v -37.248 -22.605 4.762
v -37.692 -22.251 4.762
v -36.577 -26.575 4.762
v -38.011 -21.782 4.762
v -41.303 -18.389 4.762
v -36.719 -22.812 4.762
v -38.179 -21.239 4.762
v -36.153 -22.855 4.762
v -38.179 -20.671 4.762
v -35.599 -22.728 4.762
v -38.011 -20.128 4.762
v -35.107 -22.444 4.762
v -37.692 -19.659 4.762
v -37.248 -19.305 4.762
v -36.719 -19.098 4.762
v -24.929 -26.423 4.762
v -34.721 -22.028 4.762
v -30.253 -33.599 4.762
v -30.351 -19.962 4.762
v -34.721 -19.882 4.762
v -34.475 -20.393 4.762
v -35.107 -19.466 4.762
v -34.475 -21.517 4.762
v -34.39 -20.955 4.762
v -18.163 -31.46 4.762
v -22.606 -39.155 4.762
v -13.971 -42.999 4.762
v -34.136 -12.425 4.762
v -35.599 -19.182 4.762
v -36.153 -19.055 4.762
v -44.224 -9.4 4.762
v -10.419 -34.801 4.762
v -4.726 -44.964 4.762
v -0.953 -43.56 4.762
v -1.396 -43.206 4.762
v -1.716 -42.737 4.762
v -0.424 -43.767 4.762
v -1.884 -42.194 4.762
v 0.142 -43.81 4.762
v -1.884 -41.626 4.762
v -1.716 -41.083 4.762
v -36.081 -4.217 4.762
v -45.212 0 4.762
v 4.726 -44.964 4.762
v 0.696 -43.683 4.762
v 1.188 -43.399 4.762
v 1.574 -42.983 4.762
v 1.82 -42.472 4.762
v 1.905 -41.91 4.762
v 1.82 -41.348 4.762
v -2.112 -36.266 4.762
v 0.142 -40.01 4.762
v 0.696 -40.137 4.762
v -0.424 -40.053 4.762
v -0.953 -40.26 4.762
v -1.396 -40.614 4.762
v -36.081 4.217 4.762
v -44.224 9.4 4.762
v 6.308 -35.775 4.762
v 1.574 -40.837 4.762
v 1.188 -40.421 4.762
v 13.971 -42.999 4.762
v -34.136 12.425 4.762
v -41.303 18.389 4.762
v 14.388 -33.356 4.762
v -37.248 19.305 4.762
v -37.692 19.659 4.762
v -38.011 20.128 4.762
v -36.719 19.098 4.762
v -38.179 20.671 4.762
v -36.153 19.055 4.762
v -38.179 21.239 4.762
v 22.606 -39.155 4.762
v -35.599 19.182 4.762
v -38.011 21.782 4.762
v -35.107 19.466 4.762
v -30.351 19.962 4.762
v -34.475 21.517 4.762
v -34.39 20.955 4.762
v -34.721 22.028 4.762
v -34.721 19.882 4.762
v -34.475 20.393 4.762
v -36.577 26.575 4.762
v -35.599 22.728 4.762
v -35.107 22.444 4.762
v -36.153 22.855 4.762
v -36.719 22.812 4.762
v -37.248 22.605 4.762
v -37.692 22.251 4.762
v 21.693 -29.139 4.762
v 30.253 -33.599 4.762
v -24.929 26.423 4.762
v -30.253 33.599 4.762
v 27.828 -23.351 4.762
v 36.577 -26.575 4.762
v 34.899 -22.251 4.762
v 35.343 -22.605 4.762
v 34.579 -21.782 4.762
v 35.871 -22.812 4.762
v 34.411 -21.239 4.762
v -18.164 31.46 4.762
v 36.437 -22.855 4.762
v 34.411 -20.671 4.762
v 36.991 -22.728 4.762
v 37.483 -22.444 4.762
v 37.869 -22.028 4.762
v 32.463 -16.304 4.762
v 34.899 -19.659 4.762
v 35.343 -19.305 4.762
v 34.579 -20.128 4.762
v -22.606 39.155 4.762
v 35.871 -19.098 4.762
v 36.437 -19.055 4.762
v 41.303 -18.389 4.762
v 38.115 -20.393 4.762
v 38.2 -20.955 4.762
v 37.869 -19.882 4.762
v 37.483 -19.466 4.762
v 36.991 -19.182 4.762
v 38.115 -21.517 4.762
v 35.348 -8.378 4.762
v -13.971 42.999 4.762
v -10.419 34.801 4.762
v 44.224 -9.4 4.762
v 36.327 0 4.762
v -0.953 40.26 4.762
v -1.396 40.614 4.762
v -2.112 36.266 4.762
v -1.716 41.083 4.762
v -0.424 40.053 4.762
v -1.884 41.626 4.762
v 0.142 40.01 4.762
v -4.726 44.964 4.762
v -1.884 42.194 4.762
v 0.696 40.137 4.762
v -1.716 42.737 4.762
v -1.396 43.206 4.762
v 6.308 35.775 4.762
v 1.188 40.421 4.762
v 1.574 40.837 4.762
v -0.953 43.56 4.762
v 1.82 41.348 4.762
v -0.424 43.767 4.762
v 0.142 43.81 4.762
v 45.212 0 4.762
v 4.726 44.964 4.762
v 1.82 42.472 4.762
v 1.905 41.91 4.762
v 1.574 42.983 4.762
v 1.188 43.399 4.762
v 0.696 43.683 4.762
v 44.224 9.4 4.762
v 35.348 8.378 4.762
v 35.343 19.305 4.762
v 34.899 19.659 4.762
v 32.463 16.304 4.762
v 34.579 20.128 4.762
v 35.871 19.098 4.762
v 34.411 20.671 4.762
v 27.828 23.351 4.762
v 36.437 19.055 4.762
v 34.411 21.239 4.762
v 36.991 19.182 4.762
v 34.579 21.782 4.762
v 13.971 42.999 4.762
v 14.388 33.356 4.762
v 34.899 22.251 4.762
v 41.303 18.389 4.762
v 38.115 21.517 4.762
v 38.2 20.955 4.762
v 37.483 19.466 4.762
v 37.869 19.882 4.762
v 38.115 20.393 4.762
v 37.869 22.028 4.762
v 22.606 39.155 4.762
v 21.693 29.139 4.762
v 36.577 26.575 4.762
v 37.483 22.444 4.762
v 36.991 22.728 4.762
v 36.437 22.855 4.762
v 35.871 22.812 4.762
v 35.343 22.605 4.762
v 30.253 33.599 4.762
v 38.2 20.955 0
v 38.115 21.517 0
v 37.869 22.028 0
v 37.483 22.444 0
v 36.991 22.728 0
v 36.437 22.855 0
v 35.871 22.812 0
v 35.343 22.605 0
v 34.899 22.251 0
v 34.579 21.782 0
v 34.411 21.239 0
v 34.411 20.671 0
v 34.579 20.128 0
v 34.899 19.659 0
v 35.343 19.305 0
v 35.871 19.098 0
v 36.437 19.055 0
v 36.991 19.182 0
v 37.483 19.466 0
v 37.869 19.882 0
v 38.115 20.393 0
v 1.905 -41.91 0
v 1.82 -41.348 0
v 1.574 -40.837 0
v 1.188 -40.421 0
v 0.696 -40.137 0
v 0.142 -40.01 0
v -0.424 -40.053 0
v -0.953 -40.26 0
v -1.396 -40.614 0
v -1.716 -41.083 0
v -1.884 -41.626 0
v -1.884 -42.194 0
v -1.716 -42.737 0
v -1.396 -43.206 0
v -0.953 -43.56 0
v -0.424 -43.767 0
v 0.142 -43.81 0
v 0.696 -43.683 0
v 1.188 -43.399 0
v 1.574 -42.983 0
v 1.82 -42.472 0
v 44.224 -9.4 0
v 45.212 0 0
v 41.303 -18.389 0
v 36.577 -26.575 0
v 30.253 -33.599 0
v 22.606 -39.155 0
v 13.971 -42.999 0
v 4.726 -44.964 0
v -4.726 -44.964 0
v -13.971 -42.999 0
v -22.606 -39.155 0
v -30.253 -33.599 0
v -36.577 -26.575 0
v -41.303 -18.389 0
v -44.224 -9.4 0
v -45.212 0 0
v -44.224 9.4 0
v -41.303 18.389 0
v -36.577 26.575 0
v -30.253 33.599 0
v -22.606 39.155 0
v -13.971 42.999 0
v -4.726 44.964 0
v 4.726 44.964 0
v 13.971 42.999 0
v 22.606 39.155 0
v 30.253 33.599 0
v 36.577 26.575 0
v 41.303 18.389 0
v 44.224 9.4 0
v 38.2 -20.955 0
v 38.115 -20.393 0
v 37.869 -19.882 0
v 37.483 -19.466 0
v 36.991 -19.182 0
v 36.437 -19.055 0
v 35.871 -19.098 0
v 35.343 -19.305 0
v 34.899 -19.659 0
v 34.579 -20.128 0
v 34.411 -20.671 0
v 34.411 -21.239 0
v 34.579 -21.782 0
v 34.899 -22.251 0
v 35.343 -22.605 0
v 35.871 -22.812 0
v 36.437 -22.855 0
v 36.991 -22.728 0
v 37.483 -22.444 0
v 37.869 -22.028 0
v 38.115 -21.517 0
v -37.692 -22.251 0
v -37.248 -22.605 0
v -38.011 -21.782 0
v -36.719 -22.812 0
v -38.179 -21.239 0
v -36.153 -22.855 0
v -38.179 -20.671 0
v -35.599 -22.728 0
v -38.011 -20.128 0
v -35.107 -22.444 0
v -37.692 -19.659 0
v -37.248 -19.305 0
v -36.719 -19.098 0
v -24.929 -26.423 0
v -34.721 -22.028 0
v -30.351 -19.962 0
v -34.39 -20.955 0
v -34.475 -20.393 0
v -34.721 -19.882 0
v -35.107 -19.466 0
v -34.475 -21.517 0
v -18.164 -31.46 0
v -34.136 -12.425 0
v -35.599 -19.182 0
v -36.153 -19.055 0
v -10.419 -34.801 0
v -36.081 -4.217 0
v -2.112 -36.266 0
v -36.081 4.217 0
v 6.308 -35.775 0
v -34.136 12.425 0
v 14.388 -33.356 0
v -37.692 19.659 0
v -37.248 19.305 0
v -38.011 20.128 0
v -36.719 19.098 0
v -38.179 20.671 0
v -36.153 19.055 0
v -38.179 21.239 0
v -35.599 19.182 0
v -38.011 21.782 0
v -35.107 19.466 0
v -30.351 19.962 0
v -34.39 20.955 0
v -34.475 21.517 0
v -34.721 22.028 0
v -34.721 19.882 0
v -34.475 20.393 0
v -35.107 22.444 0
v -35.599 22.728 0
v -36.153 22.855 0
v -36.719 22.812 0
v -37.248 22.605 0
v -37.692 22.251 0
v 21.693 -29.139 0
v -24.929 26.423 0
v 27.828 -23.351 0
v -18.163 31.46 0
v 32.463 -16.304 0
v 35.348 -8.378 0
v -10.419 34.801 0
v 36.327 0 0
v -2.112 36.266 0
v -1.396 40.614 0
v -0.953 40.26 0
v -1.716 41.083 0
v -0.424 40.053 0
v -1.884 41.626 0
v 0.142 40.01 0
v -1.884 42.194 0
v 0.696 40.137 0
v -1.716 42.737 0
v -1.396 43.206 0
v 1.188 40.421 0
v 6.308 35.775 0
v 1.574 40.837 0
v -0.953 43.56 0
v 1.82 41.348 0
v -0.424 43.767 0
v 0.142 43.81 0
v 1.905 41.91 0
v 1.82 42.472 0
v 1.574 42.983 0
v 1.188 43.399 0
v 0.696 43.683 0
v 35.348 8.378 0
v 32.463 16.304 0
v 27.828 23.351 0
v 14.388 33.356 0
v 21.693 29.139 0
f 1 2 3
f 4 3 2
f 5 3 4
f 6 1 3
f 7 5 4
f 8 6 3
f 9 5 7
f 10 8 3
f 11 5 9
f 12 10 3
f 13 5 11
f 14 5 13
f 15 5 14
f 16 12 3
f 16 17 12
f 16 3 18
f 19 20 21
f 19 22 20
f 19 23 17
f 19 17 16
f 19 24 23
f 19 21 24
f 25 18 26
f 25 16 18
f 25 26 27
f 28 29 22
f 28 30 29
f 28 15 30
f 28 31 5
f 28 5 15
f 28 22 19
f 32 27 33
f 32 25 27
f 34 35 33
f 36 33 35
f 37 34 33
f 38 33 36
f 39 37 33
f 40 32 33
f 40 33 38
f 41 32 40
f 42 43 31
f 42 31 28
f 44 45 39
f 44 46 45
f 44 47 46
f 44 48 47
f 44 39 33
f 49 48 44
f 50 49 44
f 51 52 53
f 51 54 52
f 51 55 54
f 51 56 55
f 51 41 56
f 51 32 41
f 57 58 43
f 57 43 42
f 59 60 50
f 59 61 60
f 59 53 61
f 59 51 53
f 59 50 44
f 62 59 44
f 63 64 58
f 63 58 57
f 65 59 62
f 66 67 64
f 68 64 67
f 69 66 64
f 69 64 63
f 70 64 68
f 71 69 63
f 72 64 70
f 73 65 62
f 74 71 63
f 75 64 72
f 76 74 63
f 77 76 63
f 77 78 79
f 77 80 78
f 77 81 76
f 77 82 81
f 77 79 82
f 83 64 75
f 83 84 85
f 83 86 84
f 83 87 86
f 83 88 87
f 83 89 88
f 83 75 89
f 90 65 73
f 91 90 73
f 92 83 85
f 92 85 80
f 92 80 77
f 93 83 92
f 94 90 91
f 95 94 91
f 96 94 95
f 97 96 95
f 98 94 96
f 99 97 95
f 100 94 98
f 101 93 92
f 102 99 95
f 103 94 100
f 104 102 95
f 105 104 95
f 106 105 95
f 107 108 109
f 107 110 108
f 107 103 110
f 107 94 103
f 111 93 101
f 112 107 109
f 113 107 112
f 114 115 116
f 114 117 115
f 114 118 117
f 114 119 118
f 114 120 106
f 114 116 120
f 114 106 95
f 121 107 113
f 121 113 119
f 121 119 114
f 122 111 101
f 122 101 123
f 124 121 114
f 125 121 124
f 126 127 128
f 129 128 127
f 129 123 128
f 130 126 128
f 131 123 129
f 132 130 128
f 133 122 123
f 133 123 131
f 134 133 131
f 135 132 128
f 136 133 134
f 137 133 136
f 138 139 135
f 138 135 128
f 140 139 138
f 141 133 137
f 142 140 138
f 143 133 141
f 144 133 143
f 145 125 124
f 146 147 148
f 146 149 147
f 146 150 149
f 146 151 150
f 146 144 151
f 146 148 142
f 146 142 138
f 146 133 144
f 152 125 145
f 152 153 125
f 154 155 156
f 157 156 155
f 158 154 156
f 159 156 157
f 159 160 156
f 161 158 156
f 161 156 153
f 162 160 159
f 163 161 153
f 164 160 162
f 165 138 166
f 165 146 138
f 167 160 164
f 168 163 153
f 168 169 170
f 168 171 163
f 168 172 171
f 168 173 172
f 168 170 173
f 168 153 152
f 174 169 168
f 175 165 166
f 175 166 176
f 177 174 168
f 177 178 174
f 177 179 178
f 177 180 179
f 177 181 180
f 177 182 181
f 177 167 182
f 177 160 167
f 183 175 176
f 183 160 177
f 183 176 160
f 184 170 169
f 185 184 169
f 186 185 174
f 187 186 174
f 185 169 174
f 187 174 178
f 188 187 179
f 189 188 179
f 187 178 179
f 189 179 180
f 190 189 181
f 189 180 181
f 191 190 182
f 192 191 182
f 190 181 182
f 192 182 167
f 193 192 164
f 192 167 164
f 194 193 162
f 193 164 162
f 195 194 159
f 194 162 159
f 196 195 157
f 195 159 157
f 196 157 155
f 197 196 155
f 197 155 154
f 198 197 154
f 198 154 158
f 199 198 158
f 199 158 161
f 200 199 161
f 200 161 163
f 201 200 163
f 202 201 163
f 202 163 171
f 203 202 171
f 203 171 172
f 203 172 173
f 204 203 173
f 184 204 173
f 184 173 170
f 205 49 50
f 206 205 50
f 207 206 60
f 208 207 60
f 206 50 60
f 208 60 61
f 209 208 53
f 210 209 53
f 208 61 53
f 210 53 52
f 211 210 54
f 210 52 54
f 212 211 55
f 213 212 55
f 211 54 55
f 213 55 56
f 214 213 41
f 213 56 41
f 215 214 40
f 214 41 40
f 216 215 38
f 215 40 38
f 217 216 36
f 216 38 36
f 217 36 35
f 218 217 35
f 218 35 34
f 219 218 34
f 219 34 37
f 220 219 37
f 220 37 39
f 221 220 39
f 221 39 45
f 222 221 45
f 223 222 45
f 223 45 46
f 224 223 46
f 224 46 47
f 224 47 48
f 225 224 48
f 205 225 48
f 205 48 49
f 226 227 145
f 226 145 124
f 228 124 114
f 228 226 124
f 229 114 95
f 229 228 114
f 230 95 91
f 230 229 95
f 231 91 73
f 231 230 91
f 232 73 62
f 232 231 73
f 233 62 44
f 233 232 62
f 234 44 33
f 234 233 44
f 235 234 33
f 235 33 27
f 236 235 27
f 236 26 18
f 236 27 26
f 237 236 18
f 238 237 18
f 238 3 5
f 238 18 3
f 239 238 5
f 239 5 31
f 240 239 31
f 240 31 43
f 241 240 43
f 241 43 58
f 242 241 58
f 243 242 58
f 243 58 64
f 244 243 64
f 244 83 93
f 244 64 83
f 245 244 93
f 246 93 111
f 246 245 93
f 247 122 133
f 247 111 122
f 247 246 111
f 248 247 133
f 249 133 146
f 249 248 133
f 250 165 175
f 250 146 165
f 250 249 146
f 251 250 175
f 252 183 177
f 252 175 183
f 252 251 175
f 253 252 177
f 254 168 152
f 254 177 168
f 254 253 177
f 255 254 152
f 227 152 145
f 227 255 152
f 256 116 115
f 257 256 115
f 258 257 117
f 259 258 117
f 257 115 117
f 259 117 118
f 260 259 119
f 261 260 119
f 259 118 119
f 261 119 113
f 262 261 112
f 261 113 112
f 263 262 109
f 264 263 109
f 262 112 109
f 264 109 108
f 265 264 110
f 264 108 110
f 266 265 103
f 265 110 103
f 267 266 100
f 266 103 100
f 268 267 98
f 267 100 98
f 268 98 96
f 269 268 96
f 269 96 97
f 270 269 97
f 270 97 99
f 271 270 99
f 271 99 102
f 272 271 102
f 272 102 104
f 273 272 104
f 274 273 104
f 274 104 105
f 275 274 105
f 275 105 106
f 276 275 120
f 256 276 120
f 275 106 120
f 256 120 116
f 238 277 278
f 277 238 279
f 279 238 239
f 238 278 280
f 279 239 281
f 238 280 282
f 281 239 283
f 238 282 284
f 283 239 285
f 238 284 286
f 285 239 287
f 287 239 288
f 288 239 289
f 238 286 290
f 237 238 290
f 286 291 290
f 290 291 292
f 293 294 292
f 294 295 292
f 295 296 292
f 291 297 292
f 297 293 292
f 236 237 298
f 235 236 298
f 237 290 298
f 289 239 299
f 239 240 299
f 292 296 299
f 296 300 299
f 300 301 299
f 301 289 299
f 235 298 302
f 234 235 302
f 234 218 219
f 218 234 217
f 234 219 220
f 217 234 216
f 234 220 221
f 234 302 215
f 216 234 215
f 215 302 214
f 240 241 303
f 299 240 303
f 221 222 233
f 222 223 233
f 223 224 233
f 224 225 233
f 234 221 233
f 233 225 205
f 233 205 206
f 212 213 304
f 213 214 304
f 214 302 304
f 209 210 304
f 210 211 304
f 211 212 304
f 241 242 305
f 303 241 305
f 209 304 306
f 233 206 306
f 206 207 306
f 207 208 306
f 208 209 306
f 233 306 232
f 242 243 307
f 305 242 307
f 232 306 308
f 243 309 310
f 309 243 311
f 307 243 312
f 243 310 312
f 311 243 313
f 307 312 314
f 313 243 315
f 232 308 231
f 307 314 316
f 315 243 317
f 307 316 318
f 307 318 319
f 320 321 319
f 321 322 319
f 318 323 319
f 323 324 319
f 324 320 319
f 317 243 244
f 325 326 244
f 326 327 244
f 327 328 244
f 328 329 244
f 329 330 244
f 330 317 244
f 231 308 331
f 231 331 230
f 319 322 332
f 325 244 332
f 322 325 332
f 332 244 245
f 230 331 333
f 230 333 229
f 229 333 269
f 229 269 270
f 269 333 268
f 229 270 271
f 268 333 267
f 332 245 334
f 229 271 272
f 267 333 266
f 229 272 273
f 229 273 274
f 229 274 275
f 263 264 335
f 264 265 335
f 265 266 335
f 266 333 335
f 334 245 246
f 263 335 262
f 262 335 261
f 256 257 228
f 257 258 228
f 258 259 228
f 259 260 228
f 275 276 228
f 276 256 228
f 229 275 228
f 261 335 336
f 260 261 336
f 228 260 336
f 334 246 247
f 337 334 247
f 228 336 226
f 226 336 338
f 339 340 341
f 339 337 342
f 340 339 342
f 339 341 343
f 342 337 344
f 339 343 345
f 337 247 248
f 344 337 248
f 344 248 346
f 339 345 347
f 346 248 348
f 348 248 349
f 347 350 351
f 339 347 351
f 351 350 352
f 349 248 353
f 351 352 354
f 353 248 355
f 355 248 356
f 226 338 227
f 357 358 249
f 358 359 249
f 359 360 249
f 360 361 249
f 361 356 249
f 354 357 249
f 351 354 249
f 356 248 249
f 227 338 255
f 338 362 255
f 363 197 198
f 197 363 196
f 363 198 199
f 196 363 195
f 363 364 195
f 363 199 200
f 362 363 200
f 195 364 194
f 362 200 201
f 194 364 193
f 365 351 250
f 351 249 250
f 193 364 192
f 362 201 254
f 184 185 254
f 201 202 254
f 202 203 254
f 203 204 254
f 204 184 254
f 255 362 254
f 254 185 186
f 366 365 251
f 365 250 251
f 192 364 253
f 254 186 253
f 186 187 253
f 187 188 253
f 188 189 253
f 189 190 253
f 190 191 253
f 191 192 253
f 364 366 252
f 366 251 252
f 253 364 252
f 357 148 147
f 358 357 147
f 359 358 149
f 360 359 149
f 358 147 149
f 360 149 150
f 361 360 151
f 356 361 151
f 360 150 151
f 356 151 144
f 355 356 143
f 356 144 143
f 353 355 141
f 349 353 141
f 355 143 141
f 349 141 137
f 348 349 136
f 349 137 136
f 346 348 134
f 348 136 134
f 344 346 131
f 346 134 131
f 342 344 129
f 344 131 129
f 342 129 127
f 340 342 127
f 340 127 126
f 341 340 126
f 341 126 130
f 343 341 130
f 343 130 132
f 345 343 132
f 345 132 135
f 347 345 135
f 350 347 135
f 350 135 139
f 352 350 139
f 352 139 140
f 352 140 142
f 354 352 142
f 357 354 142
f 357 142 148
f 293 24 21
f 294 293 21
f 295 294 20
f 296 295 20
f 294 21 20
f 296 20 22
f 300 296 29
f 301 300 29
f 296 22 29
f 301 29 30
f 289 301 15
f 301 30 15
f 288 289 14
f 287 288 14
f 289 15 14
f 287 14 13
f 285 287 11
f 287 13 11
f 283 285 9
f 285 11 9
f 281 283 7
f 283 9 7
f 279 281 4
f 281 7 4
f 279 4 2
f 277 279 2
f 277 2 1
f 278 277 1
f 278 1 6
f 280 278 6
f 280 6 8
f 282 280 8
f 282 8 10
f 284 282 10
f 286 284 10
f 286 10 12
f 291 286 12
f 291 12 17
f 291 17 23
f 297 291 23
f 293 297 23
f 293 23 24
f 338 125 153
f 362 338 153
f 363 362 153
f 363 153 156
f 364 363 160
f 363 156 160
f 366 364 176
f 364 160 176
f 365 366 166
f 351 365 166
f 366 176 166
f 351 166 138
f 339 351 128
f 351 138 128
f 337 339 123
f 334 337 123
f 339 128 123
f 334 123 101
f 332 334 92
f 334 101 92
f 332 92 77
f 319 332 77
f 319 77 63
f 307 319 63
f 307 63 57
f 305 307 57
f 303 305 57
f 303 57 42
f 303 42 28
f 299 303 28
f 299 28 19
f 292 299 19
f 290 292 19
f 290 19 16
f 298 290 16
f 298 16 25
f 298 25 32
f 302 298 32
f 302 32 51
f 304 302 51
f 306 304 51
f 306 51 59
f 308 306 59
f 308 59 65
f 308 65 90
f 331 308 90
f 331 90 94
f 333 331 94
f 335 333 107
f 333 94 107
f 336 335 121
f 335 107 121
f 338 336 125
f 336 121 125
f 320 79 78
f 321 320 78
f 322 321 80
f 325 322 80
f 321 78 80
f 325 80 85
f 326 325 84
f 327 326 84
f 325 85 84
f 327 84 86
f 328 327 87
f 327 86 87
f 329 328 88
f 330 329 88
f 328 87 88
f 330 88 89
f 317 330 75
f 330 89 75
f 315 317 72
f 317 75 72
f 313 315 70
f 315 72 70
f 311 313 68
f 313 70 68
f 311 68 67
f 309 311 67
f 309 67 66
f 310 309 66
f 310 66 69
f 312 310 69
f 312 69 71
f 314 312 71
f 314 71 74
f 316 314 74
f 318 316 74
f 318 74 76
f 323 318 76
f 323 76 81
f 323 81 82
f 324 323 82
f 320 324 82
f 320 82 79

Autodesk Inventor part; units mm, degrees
ref_plane "YZ Plane" through (0, 0, 0) normal (1, 0, 0) x (0, 1, 0)
ref_plane "XZ Plane" through (0, 0, 0) normal (0, 1, 0) x (-1, 0, 0)
ref_plane "XY Plane" through (0, 0, 0) normal (0, 0, 1) x (1, 0, 0)
sketch "Sketch1" plane through (0, 0, 0) normal (0, 0, 1) x (1, 0, 0)
  circle A0 centre (0, 0) radius 45.212
  dimension "d0" = 90.424
extrude "Extrusion1" add sketch "Sketch1" along normal blind 4.7625
sketch "Sketch2" plane through (0, 0, 0) normal (0, 0, -1) x (-1, 0, 0)
  circle A0 centre (0, 0) radius 25.4
  dimension "d3" = 50.8
extrude "Extrusion2" cut sketch "Sketch2" against normal blind 4.7625
sketch "Sketch4" plane through (0, 0, 4.7625) normal (0, 0, 1) x (1, 0, 0)
  circle A0 centre (0, 41.91) radius 1.905
  circle A1 centre (-36.2951, 20.955) radius 1.905
  circle A2 centre (-36.2951, -20.955) radius 1.905
  circle A3 centre (0, -41.91) radius 1.905
  circle A4 centre (36.2951, -20.955) radius 1.905
  circle A5 centre (36.2951, 20.955) radius 1.905
  point P0 (0, 0)
  dimension "d14" = 3.81
  dimension "d15" = 41.91
  dimension "d18" = 360
extrude "Extrusion4" cut sketch "Sketch4" against normal blind 25.4
sketch "Sketch5" plane through (0, 0, 4.7625) normal (0, 0, 1) x (1, 0, 0)
  circle A0 centre (20.795, 25.8191) radius 3.175
  line L0 (0, 0) -> (0, 18.2107)
  circle A1 centre (-20.795, 25.8191) radius 3.175
  dimension "d22" = 6.35
  dimension "d23" = 25.8191
  dimension "d24" = 20.795
extrude "Extrusion5" cut sketch "Sketch5" against normal blind 25.4
sketch "Sketch6" plane through (0, 0, 4.7625) normal (0, 0, 1) x (1, 0, 0)
  circle A0 centre (20.795, 25.8191) radius 3.175 projected
  circle A1 centre (-20.795, 25.8191) radius 3.175 projected
  circle A2 centre (36.2951, -20.955) radius 1.905 projected
  circle A3 centre (-36.2951, -20.955) radius 1.905 projected
  circle A4 centre (0, 41.91) radius 1.905 projected
  circle A5 centre (-36.2951, 20.955) radius 1.905 projected
  circle A6 centre (0, -41.91) radius 1.905 projected
  circle A7 centre (36.2951, 20.955) radius 1.905 projected
  circle A8 centre (0, 0) radius 25.4 projected
  circle A9 centre (0, 0) radius 45.212 projected
  circle A10 centre (0, 0) radius 36.327
  circle A11 centre (-20.795, 25.8191) radius 3.175 projected
extrude "Extrusion6" cut sketch "Sketch6" against normal blind 25.4 contours A10
properties part number "AluminumSealingDisc" material "Aluminum 6061"
